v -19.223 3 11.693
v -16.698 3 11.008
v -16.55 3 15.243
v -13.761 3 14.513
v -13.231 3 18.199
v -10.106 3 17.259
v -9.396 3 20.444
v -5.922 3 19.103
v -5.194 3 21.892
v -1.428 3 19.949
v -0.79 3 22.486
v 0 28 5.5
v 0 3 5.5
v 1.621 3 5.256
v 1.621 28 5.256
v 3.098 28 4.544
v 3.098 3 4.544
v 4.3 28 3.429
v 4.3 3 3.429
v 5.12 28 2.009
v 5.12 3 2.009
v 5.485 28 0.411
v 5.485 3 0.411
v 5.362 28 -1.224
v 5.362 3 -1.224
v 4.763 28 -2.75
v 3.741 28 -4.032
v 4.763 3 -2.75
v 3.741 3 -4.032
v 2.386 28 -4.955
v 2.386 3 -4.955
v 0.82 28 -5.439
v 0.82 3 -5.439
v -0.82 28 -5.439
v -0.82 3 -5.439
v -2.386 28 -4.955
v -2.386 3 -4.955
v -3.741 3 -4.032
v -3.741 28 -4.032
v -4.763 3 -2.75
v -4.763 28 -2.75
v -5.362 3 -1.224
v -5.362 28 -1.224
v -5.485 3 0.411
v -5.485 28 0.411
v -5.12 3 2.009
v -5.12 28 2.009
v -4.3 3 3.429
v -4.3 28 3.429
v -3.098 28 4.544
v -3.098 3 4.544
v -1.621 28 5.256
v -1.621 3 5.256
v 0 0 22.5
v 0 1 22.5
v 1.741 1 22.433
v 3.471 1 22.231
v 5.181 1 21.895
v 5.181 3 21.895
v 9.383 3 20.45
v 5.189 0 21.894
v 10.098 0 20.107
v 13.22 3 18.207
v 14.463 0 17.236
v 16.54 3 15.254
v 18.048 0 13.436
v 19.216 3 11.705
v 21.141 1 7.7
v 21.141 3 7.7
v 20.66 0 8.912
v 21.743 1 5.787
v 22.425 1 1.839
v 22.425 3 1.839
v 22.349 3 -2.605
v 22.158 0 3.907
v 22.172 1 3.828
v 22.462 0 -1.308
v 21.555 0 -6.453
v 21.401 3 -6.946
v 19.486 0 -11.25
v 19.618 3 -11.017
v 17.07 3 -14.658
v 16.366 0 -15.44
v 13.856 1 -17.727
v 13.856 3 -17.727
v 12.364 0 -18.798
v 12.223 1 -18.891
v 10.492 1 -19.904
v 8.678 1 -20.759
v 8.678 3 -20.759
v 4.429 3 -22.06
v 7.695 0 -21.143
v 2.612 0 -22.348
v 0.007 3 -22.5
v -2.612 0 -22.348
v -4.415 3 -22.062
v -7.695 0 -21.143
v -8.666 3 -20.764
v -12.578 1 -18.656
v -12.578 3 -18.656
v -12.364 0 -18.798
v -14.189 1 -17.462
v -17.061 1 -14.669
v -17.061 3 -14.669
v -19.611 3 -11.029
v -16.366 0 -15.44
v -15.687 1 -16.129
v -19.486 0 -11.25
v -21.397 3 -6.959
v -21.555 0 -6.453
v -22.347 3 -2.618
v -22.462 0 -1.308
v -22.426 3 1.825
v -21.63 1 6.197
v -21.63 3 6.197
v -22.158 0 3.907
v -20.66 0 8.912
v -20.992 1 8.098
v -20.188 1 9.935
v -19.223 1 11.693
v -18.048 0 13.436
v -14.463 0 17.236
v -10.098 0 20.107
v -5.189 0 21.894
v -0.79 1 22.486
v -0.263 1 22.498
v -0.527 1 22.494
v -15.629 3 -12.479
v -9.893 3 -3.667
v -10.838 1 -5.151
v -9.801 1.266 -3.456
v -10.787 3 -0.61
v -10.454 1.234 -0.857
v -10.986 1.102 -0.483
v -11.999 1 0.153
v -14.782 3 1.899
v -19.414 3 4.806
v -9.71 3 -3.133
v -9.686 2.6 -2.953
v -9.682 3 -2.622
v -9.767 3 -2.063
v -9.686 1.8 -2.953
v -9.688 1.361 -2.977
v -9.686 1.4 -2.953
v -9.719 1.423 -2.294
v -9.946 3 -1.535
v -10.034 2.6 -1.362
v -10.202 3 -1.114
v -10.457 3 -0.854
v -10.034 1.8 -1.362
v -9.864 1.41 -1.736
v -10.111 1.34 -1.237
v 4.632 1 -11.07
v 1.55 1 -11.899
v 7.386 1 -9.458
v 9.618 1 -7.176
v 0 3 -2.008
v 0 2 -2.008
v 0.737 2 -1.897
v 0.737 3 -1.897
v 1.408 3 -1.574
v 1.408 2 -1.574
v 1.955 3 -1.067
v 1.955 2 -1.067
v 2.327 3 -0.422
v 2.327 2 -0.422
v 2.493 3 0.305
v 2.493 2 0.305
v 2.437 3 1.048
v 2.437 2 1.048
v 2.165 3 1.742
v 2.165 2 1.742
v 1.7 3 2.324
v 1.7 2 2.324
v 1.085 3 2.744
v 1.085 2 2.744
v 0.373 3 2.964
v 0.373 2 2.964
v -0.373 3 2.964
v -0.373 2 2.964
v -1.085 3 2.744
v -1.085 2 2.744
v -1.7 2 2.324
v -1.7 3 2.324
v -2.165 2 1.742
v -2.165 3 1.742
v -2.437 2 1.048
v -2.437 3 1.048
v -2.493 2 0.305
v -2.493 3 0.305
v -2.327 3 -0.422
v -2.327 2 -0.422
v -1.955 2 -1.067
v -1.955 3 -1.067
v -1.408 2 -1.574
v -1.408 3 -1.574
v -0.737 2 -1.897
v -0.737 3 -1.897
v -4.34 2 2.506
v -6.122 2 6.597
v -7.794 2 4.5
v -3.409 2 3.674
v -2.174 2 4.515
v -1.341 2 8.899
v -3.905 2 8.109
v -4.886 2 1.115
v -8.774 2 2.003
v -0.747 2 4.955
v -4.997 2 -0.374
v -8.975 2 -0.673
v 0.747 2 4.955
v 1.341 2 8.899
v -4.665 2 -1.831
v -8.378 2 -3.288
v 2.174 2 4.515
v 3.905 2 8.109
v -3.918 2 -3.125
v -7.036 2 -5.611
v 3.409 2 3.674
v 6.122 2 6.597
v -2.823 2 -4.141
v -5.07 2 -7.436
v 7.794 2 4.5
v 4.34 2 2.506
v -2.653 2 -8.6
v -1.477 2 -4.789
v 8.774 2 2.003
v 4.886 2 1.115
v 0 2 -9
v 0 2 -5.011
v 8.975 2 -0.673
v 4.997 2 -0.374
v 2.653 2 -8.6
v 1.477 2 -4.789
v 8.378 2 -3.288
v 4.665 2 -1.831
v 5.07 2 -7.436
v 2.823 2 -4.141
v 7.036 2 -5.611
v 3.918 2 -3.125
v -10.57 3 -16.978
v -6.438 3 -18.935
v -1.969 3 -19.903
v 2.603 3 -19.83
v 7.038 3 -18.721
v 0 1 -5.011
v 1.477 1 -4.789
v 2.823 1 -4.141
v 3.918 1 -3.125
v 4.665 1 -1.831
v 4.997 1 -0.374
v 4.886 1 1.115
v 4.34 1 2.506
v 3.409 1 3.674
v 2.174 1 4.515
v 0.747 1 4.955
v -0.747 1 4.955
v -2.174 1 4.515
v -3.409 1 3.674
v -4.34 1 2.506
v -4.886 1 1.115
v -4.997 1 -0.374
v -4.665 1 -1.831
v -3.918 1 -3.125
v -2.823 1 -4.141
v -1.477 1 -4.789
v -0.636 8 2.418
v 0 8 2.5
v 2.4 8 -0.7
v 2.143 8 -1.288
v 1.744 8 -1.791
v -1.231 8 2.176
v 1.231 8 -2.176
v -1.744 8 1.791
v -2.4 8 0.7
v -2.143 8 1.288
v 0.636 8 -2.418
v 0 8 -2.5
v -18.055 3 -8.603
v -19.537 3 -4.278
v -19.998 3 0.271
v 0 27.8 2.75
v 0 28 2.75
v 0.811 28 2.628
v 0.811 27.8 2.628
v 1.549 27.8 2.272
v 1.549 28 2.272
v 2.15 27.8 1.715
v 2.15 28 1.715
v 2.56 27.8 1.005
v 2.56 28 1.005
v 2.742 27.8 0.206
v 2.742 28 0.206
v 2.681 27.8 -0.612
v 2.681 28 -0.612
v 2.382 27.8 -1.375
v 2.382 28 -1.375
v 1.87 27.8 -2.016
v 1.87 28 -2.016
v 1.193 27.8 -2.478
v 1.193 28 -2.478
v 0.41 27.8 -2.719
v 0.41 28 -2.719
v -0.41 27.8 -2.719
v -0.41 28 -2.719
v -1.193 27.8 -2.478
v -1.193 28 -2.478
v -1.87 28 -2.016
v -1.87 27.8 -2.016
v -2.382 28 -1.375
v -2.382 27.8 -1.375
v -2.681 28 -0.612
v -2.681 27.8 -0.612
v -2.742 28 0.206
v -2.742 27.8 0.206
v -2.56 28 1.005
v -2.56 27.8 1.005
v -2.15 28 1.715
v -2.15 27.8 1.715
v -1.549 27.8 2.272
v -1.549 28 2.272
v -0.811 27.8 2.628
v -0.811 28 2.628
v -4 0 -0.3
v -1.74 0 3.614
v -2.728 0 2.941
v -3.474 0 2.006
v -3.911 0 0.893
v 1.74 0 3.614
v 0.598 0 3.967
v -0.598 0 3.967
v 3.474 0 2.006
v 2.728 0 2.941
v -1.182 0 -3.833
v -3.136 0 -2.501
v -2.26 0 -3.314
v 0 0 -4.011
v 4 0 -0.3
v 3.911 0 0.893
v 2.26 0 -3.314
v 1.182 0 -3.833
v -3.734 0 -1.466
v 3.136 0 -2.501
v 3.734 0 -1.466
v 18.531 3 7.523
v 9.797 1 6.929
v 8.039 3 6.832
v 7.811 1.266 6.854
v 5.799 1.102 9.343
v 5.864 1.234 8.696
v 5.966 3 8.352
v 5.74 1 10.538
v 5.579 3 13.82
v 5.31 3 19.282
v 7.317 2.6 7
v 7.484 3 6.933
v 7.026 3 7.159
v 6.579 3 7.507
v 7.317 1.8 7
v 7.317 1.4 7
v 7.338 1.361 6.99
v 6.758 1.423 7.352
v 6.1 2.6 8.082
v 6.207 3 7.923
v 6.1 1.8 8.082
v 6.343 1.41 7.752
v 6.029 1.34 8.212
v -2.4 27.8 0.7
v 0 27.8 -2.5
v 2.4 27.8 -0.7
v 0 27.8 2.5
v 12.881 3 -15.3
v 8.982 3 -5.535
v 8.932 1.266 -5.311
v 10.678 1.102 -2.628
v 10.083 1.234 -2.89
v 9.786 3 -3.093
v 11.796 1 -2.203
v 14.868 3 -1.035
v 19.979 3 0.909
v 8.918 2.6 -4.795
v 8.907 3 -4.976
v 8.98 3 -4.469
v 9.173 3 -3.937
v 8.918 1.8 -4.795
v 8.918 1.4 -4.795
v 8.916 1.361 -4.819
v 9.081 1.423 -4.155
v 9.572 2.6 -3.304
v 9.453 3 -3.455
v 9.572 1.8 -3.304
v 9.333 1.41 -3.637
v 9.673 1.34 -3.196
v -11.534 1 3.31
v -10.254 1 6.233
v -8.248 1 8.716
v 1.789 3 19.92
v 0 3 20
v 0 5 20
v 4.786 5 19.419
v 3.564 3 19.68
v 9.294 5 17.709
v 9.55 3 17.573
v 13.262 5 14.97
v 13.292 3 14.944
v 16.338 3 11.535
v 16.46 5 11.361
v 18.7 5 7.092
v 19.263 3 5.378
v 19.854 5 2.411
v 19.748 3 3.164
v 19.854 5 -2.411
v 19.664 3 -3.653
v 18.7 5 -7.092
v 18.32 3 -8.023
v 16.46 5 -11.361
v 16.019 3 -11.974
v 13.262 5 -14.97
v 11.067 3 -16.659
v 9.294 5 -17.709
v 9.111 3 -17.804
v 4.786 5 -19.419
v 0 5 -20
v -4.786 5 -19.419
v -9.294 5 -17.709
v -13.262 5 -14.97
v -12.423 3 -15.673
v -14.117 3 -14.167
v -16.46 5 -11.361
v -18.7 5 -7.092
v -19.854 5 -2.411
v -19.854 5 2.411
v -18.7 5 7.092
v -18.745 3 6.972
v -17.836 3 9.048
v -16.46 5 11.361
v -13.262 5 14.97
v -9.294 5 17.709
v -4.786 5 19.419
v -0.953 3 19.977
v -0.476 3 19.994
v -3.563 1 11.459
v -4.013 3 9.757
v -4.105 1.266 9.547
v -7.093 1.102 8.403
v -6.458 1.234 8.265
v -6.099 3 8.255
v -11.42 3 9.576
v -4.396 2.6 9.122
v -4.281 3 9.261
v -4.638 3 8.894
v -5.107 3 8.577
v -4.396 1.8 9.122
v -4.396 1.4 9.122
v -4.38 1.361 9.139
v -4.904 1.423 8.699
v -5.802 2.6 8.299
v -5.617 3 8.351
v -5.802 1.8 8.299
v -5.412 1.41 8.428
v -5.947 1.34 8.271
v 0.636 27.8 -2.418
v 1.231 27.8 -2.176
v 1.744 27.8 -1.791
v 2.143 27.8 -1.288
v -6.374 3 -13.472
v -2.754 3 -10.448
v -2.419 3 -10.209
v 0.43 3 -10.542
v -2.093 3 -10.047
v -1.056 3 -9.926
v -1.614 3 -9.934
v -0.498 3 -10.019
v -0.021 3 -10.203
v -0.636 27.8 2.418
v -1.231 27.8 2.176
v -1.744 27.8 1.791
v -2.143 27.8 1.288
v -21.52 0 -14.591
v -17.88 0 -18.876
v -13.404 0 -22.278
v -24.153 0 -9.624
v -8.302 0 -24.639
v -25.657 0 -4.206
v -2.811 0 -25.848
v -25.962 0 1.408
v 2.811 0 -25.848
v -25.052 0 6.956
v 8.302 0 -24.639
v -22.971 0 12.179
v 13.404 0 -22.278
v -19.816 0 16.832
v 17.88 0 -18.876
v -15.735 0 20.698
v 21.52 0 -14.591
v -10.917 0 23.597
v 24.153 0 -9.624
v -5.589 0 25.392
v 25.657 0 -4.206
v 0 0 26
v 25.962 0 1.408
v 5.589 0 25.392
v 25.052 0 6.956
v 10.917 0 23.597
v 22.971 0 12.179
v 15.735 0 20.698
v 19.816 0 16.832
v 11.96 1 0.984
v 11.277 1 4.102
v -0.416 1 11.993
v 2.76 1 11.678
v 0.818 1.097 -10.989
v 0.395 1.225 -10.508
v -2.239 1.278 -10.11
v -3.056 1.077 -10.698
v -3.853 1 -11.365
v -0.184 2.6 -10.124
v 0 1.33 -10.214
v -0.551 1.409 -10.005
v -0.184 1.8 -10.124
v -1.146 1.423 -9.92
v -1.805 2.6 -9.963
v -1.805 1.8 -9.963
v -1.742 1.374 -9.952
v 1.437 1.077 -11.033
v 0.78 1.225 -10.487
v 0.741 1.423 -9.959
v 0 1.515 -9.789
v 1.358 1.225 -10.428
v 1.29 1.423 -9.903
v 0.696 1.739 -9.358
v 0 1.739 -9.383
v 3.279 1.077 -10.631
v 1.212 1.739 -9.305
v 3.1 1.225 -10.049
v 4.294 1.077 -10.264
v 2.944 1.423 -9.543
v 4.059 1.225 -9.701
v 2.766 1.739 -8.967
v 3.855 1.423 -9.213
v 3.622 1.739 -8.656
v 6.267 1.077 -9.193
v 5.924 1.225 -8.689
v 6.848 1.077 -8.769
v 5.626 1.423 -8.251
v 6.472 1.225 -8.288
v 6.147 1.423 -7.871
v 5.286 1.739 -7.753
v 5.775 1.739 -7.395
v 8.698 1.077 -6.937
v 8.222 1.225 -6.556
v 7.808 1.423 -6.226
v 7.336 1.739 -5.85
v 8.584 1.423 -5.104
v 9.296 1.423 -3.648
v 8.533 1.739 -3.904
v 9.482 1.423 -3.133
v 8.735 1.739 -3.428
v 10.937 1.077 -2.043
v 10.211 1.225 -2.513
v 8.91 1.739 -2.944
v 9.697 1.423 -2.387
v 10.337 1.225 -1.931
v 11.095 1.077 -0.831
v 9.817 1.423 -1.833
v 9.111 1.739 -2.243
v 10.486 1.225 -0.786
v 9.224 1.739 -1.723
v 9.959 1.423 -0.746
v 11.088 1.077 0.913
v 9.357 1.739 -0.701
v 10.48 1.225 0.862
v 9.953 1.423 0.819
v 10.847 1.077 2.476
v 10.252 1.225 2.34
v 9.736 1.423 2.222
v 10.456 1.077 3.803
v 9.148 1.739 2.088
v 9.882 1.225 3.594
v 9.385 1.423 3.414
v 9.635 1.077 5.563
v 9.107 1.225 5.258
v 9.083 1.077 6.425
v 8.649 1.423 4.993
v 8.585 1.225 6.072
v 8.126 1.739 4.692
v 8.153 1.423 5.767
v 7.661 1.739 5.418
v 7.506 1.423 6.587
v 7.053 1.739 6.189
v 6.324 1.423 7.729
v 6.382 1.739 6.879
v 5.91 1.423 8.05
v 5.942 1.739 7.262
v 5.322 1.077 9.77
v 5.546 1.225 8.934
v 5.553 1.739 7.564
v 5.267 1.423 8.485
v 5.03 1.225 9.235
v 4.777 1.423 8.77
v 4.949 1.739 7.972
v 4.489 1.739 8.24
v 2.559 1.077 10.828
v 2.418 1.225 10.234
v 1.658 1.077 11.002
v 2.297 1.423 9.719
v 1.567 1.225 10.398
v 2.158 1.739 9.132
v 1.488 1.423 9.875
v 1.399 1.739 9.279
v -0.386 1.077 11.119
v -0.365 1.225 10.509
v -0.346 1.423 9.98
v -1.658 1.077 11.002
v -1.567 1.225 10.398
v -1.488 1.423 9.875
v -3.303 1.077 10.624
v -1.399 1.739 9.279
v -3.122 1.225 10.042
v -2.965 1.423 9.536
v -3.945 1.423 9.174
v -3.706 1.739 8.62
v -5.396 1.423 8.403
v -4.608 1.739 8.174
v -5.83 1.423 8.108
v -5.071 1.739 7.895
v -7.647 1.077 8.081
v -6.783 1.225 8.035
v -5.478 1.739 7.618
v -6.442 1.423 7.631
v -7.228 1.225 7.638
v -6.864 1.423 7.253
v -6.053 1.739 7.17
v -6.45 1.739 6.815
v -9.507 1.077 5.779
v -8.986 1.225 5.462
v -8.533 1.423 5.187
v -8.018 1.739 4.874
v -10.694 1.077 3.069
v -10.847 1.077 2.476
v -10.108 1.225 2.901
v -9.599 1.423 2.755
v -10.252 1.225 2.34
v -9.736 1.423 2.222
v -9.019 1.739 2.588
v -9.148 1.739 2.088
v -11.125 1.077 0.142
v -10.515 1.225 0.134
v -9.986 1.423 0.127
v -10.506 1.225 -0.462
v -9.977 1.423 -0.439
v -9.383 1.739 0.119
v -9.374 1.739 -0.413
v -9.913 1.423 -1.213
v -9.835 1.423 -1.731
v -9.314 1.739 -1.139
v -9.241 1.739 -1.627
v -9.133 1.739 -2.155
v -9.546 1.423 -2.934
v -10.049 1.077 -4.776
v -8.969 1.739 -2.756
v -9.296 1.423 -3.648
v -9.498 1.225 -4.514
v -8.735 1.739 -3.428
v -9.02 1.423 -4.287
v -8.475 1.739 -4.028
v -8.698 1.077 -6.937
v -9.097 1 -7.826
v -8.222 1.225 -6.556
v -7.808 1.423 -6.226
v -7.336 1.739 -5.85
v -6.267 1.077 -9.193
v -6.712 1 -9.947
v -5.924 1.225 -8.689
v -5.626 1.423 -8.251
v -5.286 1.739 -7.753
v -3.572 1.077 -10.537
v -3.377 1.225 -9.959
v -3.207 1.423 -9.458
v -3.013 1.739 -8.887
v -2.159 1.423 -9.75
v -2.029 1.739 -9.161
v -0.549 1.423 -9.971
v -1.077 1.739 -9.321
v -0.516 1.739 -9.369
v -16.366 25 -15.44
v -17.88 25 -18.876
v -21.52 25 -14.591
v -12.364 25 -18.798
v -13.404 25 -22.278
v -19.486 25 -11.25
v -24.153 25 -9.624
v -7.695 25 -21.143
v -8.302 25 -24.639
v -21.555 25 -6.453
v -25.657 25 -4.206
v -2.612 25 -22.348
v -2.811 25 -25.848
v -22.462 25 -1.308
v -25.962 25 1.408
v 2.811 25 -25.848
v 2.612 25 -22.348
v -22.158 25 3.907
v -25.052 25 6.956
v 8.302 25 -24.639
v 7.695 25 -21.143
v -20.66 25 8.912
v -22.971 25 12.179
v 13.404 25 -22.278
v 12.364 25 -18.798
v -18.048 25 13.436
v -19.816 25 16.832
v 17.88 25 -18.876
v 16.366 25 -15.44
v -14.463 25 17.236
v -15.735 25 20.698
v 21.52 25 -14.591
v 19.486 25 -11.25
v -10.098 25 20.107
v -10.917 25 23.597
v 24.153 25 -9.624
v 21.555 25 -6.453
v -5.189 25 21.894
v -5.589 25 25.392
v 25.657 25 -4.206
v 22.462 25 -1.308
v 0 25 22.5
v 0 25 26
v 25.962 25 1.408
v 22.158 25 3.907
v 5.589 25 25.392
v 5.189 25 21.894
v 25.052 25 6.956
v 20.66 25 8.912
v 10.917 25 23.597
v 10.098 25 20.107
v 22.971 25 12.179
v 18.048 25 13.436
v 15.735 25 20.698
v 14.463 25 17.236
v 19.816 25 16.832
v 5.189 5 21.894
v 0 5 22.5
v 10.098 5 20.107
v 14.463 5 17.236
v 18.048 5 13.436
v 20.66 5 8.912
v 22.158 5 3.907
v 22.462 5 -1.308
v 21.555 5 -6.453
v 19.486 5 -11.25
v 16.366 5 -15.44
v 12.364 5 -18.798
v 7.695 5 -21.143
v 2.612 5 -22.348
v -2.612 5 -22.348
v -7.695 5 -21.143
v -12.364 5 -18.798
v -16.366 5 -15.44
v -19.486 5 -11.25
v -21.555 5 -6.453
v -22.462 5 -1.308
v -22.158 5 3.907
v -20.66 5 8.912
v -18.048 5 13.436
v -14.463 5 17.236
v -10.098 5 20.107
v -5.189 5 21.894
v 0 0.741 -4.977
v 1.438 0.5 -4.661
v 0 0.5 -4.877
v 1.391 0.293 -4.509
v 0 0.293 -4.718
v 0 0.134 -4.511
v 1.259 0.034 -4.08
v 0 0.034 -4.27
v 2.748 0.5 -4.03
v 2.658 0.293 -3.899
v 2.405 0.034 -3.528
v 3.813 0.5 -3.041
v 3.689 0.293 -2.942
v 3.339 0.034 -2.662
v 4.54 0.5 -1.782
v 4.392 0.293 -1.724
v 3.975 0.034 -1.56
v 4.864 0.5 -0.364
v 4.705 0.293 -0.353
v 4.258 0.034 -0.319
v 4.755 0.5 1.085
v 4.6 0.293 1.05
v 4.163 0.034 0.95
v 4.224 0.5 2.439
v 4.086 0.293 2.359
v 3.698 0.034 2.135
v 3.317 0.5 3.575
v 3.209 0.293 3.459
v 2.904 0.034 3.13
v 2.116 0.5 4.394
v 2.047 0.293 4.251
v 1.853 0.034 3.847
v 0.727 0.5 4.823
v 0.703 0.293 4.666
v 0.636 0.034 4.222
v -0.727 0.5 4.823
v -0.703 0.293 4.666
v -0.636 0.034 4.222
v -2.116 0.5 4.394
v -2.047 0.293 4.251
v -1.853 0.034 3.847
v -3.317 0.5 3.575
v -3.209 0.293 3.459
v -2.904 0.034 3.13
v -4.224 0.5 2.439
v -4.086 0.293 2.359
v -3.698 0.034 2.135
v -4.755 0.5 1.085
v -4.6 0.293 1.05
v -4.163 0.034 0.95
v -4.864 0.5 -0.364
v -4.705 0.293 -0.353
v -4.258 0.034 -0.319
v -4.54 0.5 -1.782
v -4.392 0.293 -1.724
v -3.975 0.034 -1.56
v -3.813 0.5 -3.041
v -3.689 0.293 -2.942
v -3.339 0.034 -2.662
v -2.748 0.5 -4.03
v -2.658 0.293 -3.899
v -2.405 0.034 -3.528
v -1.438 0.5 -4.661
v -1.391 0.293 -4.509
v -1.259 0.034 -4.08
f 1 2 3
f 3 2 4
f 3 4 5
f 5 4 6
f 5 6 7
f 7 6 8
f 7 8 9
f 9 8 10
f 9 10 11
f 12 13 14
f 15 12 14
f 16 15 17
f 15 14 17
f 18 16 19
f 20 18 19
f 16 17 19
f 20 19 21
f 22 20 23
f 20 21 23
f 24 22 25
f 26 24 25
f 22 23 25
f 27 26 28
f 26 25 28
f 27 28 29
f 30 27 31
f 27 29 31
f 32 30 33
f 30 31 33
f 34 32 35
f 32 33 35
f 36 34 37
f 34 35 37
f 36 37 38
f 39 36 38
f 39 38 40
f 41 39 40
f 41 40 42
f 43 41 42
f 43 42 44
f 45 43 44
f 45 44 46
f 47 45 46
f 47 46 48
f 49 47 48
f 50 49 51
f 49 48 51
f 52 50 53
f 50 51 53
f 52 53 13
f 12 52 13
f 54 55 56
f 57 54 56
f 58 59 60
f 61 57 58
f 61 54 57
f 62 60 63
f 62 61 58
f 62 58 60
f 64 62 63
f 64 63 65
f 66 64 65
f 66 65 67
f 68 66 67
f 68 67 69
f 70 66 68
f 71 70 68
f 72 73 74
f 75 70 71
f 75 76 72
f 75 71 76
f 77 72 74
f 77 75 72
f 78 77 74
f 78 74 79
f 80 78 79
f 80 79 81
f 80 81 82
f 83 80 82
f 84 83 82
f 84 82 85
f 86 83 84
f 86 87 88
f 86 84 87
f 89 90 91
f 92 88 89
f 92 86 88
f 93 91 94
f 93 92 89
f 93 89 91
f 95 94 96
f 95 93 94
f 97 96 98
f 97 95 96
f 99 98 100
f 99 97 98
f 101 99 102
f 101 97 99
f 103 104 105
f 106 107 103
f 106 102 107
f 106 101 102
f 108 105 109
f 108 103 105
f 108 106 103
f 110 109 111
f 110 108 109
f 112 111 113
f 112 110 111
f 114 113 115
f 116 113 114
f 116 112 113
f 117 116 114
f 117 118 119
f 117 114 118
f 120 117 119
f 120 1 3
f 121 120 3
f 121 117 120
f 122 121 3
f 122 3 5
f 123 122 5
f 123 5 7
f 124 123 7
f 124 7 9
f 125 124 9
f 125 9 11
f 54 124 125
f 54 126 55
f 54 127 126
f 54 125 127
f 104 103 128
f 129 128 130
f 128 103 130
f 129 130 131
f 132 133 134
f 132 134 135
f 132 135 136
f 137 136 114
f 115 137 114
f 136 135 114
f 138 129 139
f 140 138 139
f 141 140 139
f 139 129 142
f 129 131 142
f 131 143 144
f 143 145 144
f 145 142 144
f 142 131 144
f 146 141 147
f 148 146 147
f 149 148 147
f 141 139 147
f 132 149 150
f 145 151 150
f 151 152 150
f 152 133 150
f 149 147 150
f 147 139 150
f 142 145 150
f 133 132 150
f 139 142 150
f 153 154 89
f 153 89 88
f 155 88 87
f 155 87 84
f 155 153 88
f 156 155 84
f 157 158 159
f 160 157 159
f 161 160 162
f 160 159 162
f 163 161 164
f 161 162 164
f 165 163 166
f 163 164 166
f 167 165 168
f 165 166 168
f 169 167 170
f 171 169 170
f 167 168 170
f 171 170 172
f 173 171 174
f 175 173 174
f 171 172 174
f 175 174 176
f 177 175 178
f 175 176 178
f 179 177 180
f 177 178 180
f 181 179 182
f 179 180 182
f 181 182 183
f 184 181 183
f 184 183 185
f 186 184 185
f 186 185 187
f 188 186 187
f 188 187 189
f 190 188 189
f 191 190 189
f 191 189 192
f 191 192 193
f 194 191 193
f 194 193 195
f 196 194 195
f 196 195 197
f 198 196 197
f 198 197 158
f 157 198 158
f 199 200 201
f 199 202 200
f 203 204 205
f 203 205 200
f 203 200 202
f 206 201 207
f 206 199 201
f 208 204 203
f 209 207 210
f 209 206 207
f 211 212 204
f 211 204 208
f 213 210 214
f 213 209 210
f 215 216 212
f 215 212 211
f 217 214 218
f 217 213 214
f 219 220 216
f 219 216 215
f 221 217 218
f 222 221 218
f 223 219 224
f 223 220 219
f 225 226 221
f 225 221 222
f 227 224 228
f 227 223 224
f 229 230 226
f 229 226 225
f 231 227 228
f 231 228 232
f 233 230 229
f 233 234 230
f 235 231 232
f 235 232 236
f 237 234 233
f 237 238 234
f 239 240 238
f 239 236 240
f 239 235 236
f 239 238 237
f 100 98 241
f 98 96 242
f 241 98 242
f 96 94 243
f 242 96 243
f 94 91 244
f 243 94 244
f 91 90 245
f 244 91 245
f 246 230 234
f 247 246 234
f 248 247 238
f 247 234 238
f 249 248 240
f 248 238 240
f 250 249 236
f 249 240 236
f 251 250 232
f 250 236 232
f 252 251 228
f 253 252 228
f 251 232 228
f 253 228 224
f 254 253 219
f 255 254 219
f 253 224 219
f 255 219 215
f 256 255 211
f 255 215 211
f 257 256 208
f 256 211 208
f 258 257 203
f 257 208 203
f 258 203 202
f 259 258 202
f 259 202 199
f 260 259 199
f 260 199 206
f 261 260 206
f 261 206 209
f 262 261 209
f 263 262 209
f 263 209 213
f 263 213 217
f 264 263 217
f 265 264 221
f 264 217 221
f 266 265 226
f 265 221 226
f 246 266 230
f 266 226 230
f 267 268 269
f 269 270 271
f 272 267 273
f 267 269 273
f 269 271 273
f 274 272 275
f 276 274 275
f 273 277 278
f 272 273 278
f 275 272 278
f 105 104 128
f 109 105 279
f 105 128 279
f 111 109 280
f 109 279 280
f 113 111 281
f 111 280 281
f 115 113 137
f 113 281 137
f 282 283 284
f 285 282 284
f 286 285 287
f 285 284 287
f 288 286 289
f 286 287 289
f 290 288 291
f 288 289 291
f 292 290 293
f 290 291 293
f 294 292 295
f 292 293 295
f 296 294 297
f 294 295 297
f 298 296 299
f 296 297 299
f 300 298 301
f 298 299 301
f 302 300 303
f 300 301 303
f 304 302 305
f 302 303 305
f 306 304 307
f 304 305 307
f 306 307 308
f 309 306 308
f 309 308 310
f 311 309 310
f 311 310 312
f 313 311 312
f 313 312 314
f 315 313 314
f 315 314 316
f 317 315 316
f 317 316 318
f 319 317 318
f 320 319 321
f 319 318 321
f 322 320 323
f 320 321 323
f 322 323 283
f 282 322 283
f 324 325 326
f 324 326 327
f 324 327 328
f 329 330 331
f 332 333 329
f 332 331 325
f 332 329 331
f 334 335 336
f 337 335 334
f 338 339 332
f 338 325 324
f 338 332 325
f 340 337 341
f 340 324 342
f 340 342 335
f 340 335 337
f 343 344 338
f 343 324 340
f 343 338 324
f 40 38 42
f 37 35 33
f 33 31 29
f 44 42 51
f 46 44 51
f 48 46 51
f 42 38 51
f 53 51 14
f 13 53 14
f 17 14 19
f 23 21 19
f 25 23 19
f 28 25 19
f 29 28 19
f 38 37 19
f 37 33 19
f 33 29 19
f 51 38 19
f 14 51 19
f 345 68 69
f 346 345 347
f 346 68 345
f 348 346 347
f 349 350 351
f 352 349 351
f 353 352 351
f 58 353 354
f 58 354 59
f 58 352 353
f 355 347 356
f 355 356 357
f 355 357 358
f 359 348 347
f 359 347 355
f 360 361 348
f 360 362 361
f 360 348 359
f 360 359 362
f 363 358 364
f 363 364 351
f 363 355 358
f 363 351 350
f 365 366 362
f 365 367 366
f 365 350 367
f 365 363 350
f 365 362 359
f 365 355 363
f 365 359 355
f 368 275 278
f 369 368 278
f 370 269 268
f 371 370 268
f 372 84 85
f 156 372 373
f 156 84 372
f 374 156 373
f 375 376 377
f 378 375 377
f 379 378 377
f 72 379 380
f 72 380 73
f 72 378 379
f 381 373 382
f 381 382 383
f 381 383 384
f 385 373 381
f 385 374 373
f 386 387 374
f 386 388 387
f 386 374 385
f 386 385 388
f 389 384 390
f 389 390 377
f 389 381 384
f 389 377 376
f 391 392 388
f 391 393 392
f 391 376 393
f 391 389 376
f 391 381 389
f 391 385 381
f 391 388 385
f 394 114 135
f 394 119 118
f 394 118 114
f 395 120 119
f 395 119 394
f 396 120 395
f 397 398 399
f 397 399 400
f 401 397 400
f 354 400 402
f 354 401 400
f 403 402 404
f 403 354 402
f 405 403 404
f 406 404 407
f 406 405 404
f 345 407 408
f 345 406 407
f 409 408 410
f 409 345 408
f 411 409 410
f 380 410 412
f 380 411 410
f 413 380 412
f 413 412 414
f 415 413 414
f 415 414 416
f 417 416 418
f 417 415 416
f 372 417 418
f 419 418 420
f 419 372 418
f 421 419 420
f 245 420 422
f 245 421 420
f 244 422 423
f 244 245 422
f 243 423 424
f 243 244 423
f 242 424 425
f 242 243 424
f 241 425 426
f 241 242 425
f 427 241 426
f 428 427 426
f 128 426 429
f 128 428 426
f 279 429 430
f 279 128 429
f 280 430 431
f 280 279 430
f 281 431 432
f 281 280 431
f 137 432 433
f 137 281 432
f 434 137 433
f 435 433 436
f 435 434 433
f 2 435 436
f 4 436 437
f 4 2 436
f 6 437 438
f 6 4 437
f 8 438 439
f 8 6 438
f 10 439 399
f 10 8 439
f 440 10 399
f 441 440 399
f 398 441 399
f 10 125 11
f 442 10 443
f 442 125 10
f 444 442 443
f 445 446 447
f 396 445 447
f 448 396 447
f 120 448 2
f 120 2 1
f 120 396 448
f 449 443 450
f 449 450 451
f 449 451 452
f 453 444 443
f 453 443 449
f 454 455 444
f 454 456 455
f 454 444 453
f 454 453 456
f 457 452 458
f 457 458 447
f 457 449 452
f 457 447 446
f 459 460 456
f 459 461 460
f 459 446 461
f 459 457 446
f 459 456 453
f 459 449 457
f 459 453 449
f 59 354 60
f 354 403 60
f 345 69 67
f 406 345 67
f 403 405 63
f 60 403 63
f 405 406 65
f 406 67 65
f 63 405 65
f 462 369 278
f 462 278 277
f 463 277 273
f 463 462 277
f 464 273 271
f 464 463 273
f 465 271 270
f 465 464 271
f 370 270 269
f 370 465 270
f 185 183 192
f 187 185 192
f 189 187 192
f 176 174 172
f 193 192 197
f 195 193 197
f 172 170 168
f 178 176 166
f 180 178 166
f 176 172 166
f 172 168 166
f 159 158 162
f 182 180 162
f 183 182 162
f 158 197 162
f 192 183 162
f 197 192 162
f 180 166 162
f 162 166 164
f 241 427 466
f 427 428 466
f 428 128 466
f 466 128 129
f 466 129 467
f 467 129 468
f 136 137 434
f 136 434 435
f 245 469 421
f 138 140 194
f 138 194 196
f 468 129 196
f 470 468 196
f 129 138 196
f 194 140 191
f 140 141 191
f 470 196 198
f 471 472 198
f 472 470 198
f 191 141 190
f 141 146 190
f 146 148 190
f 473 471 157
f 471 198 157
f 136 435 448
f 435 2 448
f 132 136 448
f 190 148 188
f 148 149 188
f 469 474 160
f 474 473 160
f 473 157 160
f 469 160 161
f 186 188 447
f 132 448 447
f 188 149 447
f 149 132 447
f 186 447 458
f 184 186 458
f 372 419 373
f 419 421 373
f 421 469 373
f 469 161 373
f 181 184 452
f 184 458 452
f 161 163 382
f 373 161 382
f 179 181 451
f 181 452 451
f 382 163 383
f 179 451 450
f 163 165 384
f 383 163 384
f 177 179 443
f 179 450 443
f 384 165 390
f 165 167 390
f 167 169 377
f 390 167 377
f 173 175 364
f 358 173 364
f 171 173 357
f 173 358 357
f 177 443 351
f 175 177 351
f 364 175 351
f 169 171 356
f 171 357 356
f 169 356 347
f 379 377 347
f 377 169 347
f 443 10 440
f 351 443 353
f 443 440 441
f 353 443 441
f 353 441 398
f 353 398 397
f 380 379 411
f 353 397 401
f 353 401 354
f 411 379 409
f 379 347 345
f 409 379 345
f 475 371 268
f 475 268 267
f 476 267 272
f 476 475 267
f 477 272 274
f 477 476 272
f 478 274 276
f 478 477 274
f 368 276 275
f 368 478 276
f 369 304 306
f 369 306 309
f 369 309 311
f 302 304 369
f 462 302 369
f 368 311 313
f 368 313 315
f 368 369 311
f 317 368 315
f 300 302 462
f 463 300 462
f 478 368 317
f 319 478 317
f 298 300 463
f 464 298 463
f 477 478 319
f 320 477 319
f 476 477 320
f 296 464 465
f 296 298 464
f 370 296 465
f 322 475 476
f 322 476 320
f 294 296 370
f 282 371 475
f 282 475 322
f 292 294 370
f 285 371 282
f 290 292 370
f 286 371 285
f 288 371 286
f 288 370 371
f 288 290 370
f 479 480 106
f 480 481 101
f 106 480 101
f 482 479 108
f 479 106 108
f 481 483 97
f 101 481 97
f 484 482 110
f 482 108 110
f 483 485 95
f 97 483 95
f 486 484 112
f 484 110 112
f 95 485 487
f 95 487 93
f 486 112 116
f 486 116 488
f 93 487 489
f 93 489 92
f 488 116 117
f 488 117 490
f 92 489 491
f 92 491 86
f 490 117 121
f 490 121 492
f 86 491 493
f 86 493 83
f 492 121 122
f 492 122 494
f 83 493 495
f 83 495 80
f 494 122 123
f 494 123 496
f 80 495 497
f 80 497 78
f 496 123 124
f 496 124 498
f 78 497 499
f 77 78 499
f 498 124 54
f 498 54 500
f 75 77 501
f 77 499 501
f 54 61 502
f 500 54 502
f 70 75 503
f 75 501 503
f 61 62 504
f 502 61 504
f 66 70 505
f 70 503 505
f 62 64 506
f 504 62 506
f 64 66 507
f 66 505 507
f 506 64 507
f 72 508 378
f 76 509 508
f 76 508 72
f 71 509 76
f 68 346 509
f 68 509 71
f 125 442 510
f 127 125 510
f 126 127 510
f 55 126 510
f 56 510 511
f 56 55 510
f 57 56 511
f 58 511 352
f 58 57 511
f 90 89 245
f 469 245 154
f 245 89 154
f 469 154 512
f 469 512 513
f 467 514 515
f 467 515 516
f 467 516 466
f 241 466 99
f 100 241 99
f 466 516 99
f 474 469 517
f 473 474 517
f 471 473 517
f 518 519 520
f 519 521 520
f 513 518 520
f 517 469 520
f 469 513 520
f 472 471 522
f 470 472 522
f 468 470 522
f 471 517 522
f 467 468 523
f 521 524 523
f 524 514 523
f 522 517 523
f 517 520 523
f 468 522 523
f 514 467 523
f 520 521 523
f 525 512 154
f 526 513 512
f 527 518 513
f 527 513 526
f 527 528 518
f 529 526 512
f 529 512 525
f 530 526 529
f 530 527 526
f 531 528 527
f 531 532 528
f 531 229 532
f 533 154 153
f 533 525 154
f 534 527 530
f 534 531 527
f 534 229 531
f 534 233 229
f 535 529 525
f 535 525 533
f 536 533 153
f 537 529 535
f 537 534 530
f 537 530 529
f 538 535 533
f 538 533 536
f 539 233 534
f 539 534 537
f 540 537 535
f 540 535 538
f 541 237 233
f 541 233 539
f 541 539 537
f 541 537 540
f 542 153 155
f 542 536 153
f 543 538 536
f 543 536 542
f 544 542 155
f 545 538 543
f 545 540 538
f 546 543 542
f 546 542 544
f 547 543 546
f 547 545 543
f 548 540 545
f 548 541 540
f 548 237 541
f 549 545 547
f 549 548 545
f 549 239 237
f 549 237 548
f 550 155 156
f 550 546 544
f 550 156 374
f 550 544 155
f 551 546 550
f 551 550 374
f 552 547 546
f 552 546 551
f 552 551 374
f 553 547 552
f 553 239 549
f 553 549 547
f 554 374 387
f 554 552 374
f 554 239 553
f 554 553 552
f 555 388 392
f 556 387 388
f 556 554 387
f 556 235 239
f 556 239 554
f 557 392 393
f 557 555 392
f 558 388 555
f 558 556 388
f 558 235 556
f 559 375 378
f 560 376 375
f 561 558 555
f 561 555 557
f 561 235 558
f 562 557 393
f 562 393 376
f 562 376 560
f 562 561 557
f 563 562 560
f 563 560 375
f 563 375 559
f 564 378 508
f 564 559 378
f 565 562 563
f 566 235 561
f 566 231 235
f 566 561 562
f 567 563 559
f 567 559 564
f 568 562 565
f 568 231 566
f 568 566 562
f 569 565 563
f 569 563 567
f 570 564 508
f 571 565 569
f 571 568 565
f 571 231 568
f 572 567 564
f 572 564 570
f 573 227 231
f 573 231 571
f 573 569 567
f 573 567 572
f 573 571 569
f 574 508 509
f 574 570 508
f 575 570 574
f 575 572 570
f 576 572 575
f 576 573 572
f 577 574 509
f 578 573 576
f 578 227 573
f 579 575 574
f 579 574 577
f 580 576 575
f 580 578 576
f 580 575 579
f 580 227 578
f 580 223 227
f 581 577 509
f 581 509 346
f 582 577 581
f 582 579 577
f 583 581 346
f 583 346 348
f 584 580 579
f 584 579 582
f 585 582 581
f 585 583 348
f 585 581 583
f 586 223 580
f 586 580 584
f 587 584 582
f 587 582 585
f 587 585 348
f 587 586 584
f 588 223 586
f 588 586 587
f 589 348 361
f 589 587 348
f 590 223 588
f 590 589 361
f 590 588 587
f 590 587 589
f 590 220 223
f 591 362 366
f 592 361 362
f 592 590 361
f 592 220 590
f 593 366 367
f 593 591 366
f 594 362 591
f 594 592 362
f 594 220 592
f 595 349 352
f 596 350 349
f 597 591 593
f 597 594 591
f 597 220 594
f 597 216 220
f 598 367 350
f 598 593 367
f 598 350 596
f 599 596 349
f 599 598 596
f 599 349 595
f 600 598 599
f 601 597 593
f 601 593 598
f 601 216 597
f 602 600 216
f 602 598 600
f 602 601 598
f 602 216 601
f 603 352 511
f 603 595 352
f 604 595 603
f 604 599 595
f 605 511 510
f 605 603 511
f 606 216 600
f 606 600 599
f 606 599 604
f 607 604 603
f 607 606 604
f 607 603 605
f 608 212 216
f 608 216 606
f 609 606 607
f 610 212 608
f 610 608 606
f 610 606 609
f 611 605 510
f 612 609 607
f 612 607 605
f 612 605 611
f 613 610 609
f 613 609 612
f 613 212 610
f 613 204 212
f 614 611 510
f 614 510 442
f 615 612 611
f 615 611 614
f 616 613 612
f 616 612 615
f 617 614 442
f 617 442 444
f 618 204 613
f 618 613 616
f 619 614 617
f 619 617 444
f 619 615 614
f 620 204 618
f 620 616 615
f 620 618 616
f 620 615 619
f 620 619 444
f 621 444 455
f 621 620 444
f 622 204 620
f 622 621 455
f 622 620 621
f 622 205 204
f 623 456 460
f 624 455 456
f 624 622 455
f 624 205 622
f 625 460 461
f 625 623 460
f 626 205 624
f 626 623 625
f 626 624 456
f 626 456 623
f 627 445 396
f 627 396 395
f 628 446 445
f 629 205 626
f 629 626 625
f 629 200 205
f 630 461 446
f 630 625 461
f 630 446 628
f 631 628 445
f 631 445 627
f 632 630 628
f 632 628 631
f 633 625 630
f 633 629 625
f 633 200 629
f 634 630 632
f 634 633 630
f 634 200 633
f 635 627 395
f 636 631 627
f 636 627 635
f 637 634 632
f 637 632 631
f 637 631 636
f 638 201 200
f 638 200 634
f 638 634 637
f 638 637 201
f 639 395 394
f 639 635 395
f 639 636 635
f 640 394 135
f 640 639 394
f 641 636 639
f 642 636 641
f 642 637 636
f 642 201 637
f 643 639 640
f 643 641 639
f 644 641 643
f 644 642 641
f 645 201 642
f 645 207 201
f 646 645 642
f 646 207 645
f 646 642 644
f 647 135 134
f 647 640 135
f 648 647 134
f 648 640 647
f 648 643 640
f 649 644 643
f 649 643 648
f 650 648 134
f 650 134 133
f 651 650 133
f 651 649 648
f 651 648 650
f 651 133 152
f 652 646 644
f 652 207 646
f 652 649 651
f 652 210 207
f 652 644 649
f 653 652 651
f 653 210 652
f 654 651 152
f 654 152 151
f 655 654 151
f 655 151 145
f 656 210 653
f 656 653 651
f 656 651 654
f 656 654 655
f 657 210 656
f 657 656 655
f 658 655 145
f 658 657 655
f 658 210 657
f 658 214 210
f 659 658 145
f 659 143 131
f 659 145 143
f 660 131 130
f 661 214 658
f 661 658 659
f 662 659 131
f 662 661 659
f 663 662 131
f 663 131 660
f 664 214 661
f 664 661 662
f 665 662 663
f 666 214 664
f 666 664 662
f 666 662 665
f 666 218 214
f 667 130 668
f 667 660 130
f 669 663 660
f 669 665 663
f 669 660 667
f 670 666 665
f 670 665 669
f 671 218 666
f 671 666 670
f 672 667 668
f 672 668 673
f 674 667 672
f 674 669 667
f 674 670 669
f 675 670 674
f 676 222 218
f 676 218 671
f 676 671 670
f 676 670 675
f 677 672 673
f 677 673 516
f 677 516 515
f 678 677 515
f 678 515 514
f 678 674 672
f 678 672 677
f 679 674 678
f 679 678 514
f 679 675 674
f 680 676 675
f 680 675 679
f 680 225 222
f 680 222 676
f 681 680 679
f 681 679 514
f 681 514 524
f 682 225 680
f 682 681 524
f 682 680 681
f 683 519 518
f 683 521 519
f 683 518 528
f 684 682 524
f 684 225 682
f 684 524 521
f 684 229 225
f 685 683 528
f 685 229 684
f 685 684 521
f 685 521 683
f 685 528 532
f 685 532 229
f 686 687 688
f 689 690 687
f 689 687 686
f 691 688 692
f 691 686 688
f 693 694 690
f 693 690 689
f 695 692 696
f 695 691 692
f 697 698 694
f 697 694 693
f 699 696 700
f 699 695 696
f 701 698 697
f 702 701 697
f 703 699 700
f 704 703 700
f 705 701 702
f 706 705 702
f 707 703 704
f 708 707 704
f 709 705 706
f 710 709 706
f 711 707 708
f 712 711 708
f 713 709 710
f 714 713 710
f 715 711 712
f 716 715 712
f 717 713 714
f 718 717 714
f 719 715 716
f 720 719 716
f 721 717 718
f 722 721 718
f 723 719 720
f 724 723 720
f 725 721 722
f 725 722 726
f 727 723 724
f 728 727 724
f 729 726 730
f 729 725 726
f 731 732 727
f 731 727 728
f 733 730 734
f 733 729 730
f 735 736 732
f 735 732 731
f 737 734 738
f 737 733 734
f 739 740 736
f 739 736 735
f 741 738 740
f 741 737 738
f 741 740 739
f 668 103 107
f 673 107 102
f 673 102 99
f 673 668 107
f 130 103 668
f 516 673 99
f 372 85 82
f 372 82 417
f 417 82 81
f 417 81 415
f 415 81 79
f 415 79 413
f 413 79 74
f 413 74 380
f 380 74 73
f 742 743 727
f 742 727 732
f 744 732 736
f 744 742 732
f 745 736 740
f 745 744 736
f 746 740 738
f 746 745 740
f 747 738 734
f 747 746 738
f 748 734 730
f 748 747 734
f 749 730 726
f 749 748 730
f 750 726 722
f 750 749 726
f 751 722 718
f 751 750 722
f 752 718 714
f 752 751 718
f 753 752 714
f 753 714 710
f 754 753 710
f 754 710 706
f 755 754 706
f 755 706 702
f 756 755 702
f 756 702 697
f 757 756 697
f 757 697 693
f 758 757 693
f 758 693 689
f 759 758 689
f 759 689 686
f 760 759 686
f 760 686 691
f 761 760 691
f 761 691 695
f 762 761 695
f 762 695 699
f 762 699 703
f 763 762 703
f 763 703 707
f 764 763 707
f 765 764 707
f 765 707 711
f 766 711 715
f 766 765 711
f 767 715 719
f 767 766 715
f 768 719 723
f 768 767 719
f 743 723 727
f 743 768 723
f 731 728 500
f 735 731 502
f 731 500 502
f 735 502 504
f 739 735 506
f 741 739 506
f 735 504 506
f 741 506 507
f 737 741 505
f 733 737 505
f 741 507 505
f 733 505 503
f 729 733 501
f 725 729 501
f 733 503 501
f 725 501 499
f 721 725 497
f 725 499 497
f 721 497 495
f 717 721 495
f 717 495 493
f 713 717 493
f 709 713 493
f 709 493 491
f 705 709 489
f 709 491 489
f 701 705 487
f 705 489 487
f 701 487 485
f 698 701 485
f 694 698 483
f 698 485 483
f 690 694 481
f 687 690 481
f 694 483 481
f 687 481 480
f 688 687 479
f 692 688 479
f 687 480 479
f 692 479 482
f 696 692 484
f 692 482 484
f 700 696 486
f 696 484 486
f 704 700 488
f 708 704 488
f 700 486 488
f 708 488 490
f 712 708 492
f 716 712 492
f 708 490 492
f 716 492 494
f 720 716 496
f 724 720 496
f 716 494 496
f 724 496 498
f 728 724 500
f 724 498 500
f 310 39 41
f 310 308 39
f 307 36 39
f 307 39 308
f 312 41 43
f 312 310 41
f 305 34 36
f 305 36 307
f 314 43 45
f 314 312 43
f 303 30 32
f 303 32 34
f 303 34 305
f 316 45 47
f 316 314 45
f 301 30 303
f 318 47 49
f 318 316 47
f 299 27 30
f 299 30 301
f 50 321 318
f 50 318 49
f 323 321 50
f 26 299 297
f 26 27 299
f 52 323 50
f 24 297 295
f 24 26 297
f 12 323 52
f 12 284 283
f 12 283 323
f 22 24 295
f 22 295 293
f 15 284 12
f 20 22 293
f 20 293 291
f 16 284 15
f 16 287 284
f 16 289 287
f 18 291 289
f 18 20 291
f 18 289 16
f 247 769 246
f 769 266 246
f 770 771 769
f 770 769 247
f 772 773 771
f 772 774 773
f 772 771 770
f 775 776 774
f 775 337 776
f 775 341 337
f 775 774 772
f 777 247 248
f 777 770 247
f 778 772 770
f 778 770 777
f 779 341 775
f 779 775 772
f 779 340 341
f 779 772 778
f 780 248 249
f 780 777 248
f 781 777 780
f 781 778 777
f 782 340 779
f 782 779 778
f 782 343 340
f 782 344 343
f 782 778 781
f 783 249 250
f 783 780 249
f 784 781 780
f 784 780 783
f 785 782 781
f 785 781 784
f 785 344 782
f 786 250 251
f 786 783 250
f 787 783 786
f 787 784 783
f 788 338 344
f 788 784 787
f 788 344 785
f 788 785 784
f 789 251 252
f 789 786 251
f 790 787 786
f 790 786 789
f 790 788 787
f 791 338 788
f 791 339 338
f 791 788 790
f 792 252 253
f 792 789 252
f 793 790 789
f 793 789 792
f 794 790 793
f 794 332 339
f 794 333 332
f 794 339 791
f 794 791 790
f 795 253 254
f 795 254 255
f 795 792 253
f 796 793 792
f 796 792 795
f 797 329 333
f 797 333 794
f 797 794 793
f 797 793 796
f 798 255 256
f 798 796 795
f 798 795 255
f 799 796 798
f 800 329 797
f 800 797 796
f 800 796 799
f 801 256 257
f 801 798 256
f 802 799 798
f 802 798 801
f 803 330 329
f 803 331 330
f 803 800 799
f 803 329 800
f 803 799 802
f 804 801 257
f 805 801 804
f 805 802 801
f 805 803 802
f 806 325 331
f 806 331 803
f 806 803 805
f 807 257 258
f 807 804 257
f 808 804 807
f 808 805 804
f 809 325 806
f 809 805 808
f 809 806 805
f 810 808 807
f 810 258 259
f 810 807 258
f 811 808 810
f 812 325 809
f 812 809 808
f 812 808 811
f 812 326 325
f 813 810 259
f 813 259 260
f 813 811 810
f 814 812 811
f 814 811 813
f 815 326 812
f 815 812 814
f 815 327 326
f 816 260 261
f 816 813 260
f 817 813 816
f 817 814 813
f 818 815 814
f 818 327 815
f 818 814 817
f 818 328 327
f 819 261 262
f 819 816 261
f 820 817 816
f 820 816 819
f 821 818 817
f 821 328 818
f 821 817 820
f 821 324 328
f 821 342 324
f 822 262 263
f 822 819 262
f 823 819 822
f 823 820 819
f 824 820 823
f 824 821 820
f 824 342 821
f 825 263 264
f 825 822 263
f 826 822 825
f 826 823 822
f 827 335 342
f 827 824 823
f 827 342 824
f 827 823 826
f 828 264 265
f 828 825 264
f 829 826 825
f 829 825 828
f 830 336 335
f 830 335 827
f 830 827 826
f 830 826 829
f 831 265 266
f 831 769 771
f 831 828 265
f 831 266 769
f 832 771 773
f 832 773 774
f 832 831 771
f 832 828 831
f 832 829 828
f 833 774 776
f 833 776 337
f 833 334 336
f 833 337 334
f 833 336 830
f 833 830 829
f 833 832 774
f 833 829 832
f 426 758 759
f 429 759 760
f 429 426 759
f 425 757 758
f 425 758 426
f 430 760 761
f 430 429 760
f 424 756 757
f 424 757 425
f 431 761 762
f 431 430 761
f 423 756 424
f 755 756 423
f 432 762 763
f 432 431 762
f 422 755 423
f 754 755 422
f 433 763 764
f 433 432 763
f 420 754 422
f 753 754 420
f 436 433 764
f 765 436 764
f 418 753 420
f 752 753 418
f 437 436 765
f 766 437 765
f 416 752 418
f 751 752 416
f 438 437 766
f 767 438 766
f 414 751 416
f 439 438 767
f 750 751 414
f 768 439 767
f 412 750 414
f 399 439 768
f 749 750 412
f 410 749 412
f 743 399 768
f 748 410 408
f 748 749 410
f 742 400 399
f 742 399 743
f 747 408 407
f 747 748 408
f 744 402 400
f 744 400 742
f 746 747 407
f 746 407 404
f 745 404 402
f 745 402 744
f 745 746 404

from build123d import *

# Parameters (mm, degrees)
SKETCH1_R           = 26
SKETCH1_R_2         = 22.5
BOSS_EXTRUDE1_DEPTH = 25
BOSS_EXTRUDE2_START = -2
SKETCH3_R           = 22.5
SKETCH3_R_2         = 20
BOSS_EXTRUDE2_DEPTH = 2
BOSS_EXTRUDE3_START = 2
SKETCH4_R           = 2.5
BOSS_EXTRUDE3_DEPTH = 2
SKETCH5_R           = 5.5
BOSS_EXTRUDE4_DEPTH = 25
CUT_EXTRUDE1_DEPTH  = 20
SKETCH7_R           = 9
CUT_EXTRUDE2_DEPTH  = 1
FILLET5_R           = 5
SKETCH8_R           = 5.011357572
BOSS_EXTRUDE5_DEPTH = 2
FILLET6_R           = 1
SKETCH9_R           = 2.75
CUT_EXTRUDE3_DEPTH  = 0.2


with BuildPart() as part:
    # Sketch1 → Boss-Extrude1 (new body)
    with BuildSketch(Plane(origin=(0, 0, 0), x_dir=(1, 0, 0), z_dir=(0, 1, 0))):
        with Locations(Location((0, 0, 0), (0, 0, 270))):
            Circle(SKETCH1_R)
        with Locations(Location((0, 0, 0), (0, 0, 270))):
            Circle(SKETCH1_R_2, mode=Mode.SUBTRACT)
    extrude(amount=BOSS_EXTRUDE1_DEPTH)

    # Sketch3 → Boss-Extrude2 (add)
    with BuildSketch(Plane(origin=(0, 5, 0), x_dir=(1, 0, 0), z_dir=(0, 1, 0)).offset(BOSS_EXTRUDE2_START)):
        with Locations(Location((0, 0, 0), (0, 0, 270))):
            Circle(SKETCH3_R)
        with Locations(Location((0, 0, 0), (0, 0, 270))):
            Circle(SKETCH3_R_2, mode=Mode.SUBTRACT)
    extrude(amount=BOSS_EXTRUDE2_DEPTH)

    # Sketch4 → Boss-Extrude3 (add)
    with BuildSketch(Plane.XZ.offset(-3).offset(BOSS_EXTRUDE3_START)):
        with BuildLine():
            ThreePointArc((8.678433718, -20.758968862), (11.368893562, -19.41644301), (13.85632013, -17.727165381))
            add(Edge.make_bspline(
                [(13.85632013, -17.727165381), (12.295332772, -13.841569941), (10.734345415, -9.955974501), (9.173358058, -6.070379061), (9.017640236, -5.682767684), (8.706204592, -4.907544931), (9.510436229, -3.072197276), (10.29132151, -2.775244997), (10.681764151, -2.626768858), (14.596088137, -1.138243647), (18.510412124, 0.350281564), (22.424736111, 1.838806775)],
                knots=[0, 0, 0, 0, 0.25002021, 0.25002021, 0.25002021, 0.27496122, 0.299902231, 0.324843242, 0.324843242, 0.324843242, 0.574885595, 0.574885595, 0.574885595, 0.574885595], degree=3))
            ThreePointArc((22.424736111, 1.838806775), (21.979315966, 4.812449445), (21.141374551, 7.700148186))
            add(Edge.make_bspline(
                [(21.141374551, 7.700148186), (16.963582067, 7.416276013), (12.785789582, 7.132403839), (8.607997098, 6.848531665), (8.191237319, 6.820213718), (7.357717761, 6.763577825), (5.860719657, 8.09560118), (5.81960808, 8.930030516), (5.799052291, 9.347245184), (5.592973323, 13.529968105), (5.386894355, 17.712691026), (5.180815387, 21.895413947)],
                knots=[0, 0, 0, 0, 0.25002021, 0.25002021, 0.25002021, 0.27496122, 0.299902231, 0.324843242, 0.324843242, 0.324843242, 0.574885595, 0.574885595, 0.574885595, 0.574885595], degree=3))
            ThreePointArc((5.180815387, 21.895413947), (2.215070754, 22.390700336), (-0.790232088, 22.486118679))
            add(Edge.make_bspline(
                [(-0.790232088, 22.486118679), (-1.811262484, 18.425080587), (-2.83229288, 14.364042495), (-3.853323276, 10.303004403), (-3.955177163, 9.897891573), (-4.158884936, 9.087665912), (-5.888312283, 8.075553965), (-6.694605915, 8.294307376), (-7.097752732, 8.403684082), (-11.139440525, 9.500223802), (-15.181128319, 10.596763522), (-19.222816112, 11.693303242)],
                knots=[0, 0, 0, 0, 0.25002021, 0.25002021, 0.25002021, 0.27496122, 0.299902231, 0.324843242, 0.324843242, 0.324843242, 0.574885595, 0.574885595, 0.574885595, 0.574885595], degree=3))
            ThreePointArc((-19.222816112, 11.693303242), (-20.610326953, 9.025764395), (-21.629764841, 6.197037432))
            add(Edge.make_bspline(
                [(-17.061169104, -14.668555103), (-14.769347644, -11.163530998), (-12.477526184, -7.658506894), (-10.185704723, -4.15348279), (-9.957102077, -3.803866644), (-9.499896784, -3.104634352), (-9.928050007, -1.147091413), (-10.635671237, -0.702980309), (-10.989481852, -0.480924757), (-14.536242848, 1.745062639), (-18.083003844, 3.971050036), (-21.629764841, 6.197037432)],
                knots=[0, 0, 0, 0, 0.250042353, 0.250042353, 0.250042353, 0.274983364, 0.299924375, 0.324865386, 0.324865386, 0.324865386, 0.574885595, 0.574885595, 0.574885595, 0.574885595], degree=3))
            ThreePointArc((-17.061169104, -14.668555103), (-14.95295333, -16.812471166), (-12.577697752, -18.656138916))
            add(Edge.make_bspline(
                [(8.678433718, -20.758968862), (6.053169483, -17.496205114), (3.427905248, -14.233441366), (0.802641014, -10.970677618), (0.540778402, -10.645226251), (0.01705318, -9.994323517), (-1.97698741, -9.796607394), (-2.618029155, -10.332357297), (-2.938550027, -10.600232249), (-6.151599269, -13.285534472), (-9.36464851, -15.970836694), (-12.577697752, -18.656138916)],
                knots=[0, 0, 0, 0, 0.250042353, 0.250042353, 0.250042353, 0.274983364, 0.299924375, 0.324865386, 0.324865386, 0.324865386, 0.574885595, 0.574885595, 0.574885595, 0.574885595], degree=3))
        make_face()
        with Locations(Location((0, 0.491696266, 0), (0, 0, 270))):
            Circle(SKETCH4_R, mode=Mode.SUBTRACT)
    extrude(amount=-BOSS_EXTRUDE3_DEPTH)

    # Sketch7 → Cut-Extrude2 (cut)
    with BuildSketch(Plane.XZ.offset(-1)):
        with Locations(Location((0, 0, 0), (0, 0, 270))):
            Circle(SKETCH7_R)
    extrude(amount=-CUT_EXTRUDE2_DEPTH, mode=Mode.SUBTRACT)

    # Fillet5
    # the kernel refuses this fillet: 5 mm, written as the material it takes off along each edge
    with BuildSketch(Plane(origin=(0, 1, 0), x_dir=(0, 0, -1), z_dir=(-1, 0, 0))) as fillet5_piece_1:
        with BuildLine():
            CenterArc((12, -5), FILLET5_R, 90, 36.869897646)
            Line((9, -1), (8.94, -0.92))
            ThreePointArc((8.94, -0.92), (8.9, -0.5), (8.9, 0))
            Line((8.9, 0), (9, 0.1))
            Line((9, 0.1), (12, 0.1))
            Line((12, 0.1), (12, 0))
        make_face()
    revolve(axis=Axis((0, 1, 0), (0, -1, 0)), mode=Mode.SUBTRACT)

    # Sketch8 → Boss-Extrude5 (add)
    with BuildSketch(Plane.XZ.offset(-2)):
        with Locations(Location((0, 0, 0), (0, 0, 270))):
            Circle(SKETCH8_R)
    extrude(amount=BOSS_EXTRUDE5_DEPTH)

    # Fillet6
    fillet6_edges = [part.edges().sort_by_distance(p)[0] for p in [
        (0, 0, 5.011357572),
    ]]
    fillet(fillet6_edges, radius=FILLET6_R)


with BuildPart() as body_2:
    # Sketch5 → Boss-Extrude4 (new body)
    with BuildSketch(Plane(origin=(0, 3, 0), x_dir=(1, 0, 0), z_dir=(0, 1, 0))):
        with Locations(Location((0, 0, 0), (0, 0, 270))):
            Circle(SKETCH5_R)
    extrude(amount=BOSS_EXTRUDE4_DEPTH)

    # Sketch6 → Cut-Extrude1 (cut)
    with BuildSketch(Plane(origin=(0, 28, 0), x_dir=(1, 0, 0), z_dir=(0, 1, 0))):
        with BuildLine():
            Line((-2.4, -0.7), (0, 2.5))
            ThreePointArc((0, 2.5), (1.5, 2), (2.4, 0.7))
            Line((2.4, 0.7), (0, -2.5))
            ThreePointArc((0, -2.5), (-1.5, -2), (-2.4, -0.7))
        make_face()
    extrude(amount=-CUT_EXTRUDE1_DEPTH, mode=Mode.SUBTRACT)

    # Sketch9 → Cut-Extrude3 (cut)
    with BuildSketch(Plane(origin=(0, 28, 0), x_dir=(1, 0, 0), z_dir=(0, 1, 0))):
        with Locations(Location((0, 0, 0), (0, 0, 270))):
            Circle(SKETCH9_R)
    extrude(amount=-CUT_EXTRUDE3_DEPTH, mode=Mode.SUBTRACT)


solid = Compound([part.part, body_2.part])
